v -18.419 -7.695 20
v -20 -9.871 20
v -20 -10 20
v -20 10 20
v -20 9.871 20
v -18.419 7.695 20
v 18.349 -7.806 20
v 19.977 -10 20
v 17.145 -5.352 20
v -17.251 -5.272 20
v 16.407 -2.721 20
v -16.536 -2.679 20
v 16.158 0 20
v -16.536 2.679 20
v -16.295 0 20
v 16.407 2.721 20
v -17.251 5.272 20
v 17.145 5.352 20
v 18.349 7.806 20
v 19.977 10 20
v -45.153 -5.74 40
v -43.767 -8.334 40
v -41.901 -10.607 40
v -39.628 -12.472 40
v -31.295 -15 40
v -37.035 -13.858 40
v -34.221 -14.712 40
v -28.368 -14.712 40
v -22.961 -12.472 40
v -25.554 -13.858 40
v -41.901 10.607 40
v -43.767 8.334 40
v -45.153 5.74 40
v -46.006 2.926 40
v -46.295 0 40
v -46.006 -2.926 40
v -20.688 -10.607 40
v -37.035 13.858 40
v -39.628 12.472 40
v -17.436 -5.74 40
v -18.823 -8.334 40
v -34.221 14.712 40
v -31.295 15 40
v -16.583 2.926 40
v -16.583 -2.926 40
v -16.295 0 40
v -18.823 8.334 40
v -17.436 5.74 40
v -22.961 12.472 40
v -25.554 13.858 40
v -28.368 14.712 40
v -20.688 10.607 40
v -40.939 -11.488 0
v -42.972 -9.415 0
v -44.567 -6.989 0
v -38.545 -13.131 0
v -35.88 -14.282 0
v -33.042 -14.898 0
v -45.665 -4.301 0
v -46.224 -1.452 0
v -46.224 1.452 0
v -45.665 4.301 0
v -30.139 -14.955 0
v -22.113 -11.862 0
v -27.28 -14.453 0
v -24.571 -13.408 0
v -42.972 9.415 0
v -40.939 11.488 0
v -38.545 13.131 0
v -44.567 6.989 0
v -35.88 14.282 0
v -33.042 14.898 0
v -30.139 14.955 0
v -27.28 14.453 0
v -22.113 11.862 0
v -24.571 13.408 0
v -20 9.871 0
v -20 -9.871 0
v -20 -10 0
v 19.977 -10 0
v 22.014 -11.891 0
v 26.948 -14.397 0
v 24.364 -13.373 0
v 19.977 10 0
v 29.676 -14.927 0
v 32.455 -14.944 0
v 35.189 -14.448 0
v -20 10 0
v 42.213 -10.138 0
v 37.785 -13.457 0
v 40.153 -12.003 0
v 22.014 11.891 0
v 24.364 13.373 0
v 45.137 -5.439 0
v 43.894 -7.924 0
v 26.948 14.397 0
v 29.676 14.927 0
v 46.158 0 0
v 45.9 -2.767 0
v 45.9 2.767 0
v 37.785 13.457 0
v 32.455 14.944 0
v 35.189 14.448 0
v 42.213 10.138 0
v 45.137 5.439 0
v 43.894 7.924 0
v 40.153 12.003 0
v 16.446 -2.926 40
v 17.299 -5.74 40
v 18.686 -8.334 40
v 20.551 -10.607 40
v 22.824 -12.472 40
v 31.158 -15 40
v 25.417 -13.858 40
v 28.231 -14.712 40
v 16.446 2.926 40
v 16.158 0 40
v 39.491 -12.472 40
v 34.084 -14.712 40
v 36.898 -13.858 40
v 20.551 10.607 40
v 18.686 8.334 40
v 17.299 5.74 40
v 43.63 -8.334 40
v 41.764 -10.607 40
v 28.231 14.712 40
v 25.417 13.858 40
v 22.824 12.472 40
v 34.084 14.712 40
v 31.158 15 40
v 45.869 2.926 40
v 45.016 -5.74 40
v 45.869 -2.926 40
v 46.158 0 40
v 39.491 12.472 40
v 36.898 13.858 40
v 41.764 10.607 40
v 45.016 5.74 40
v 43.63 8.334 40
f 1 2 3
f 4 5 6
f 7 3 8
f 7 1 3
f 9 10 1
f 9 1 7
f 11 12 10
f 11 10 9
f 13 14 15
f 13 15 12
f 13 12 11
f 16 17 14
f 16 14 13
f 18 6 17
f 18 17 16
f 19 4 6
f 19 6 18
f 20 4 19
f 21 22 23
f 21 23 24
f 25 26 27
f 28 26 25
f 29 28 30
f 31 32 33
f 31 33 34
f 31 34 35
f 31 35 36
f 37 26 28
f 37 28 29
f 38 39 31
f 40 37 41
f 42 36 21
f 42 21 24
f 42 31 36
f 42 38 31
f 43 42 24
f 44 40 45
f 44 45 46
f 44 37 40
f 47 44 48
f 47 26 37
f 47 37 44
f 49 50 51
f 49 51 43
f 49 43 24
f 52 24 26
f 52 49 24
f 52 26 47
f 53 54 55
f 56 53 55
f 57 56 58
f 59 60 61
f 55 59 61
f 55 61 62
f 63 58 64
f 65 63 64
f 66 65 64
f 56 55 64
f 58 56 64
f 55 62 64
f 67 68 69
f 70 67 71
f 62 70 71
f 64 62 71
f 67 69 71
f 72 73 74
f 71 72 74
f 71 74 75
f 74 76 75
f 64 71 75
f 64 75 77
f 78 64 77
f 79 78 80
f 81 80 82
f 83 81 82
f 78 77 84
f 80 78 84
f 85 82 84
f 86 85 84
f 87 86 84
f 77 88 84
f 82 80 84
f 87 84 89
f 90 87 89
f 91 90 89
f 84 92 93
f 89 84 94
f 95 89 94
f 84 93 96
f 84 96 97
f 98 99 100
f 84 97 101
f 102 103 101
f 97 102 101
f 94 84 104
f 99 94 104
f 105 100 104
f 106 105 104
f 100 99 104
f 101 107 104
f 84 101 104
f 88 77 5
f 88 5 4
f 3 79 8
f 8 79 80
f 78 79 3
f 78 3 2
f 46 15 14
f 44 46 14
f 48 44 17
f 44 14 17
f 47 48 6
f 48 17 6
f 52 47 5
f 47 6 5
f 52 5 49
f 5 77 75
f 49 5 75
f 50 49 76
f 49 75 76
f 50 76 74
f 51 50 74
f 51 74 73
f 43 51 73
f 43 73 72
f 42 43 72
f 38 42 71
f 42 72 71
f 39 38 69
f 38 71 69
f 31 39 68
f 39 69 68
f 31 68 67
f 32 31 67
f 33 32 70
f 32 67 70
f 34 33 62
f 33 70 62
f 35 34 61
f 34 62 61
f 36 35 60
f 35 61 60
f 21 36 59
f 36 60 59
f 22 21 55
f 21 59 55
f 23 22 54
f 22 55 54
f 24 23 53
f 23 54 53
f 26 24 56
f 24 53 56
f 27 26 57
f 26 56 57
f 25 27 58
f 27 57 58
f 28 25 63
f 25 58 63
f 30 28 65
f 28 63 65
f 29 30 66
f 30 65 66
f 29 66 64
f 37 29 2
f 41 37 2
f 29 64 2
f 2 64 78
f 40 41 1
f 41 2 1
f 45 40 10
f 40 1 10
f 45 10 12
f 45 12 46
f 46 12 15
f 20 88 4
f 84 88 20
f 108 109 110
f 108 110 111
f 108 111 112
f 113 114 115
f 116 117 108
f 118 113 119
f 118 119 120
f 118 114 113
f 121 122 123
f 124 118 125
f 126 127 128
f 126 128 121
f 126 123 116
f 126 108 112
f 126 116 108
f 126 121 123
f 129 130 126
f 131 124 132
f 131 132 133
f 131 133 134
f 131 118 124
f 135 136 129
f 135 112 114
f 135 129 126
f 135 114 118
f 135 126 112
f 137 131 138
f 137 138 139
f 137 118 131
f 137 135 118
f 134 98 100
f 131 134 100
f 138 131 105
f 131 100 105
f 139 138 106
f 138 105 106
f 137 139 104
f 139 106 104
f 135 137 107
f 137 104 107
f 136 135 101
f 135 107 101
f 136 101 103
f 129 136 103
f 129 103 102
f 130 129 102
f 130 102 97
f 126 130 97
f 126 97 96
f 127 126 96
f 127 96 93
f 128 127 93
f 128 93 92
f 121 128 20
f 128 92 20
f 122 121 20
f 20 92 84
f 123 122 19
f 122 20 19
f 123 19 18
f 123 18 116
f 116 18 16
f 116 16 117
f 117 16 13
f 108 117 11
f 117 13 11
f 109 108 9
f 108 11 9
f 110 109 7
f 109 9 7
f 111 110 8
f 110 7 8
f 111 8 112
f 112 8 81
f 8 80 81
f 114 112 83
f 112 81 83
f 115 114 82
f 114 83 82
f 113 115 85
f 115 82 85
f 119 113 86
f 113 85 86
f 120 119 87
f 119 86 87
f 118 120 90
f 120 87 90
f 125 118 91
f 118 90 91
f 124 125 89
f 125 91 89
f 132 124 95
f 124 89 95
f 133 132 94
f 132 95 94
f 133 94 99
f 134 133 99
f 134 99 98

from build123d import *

# Parameters (mm, degrees)
F0_W     = 40
F0_H     = 20
F2_DEPTH = 20
F1_R     = 15
F3_DEPTH = 40


with BuildPart() as f2:
    # F0 (on Top) → F2 (new body)
    with BuildSketch(Plane.XY):
        Rectangle(F0_W, F0_H)
    extrude(amount=F2_DEPTH)

    # F1 (on Top) → F3 (join)
    with BuildSketch(Plane.XY):
        with Locations((-31.294566, 0)):
            Circle(F1_R)
        with Locations((31.157609, 0)):
            Circle(F1_R)
    extrude(amount=F3_DEPTH)


solid = f2.part
